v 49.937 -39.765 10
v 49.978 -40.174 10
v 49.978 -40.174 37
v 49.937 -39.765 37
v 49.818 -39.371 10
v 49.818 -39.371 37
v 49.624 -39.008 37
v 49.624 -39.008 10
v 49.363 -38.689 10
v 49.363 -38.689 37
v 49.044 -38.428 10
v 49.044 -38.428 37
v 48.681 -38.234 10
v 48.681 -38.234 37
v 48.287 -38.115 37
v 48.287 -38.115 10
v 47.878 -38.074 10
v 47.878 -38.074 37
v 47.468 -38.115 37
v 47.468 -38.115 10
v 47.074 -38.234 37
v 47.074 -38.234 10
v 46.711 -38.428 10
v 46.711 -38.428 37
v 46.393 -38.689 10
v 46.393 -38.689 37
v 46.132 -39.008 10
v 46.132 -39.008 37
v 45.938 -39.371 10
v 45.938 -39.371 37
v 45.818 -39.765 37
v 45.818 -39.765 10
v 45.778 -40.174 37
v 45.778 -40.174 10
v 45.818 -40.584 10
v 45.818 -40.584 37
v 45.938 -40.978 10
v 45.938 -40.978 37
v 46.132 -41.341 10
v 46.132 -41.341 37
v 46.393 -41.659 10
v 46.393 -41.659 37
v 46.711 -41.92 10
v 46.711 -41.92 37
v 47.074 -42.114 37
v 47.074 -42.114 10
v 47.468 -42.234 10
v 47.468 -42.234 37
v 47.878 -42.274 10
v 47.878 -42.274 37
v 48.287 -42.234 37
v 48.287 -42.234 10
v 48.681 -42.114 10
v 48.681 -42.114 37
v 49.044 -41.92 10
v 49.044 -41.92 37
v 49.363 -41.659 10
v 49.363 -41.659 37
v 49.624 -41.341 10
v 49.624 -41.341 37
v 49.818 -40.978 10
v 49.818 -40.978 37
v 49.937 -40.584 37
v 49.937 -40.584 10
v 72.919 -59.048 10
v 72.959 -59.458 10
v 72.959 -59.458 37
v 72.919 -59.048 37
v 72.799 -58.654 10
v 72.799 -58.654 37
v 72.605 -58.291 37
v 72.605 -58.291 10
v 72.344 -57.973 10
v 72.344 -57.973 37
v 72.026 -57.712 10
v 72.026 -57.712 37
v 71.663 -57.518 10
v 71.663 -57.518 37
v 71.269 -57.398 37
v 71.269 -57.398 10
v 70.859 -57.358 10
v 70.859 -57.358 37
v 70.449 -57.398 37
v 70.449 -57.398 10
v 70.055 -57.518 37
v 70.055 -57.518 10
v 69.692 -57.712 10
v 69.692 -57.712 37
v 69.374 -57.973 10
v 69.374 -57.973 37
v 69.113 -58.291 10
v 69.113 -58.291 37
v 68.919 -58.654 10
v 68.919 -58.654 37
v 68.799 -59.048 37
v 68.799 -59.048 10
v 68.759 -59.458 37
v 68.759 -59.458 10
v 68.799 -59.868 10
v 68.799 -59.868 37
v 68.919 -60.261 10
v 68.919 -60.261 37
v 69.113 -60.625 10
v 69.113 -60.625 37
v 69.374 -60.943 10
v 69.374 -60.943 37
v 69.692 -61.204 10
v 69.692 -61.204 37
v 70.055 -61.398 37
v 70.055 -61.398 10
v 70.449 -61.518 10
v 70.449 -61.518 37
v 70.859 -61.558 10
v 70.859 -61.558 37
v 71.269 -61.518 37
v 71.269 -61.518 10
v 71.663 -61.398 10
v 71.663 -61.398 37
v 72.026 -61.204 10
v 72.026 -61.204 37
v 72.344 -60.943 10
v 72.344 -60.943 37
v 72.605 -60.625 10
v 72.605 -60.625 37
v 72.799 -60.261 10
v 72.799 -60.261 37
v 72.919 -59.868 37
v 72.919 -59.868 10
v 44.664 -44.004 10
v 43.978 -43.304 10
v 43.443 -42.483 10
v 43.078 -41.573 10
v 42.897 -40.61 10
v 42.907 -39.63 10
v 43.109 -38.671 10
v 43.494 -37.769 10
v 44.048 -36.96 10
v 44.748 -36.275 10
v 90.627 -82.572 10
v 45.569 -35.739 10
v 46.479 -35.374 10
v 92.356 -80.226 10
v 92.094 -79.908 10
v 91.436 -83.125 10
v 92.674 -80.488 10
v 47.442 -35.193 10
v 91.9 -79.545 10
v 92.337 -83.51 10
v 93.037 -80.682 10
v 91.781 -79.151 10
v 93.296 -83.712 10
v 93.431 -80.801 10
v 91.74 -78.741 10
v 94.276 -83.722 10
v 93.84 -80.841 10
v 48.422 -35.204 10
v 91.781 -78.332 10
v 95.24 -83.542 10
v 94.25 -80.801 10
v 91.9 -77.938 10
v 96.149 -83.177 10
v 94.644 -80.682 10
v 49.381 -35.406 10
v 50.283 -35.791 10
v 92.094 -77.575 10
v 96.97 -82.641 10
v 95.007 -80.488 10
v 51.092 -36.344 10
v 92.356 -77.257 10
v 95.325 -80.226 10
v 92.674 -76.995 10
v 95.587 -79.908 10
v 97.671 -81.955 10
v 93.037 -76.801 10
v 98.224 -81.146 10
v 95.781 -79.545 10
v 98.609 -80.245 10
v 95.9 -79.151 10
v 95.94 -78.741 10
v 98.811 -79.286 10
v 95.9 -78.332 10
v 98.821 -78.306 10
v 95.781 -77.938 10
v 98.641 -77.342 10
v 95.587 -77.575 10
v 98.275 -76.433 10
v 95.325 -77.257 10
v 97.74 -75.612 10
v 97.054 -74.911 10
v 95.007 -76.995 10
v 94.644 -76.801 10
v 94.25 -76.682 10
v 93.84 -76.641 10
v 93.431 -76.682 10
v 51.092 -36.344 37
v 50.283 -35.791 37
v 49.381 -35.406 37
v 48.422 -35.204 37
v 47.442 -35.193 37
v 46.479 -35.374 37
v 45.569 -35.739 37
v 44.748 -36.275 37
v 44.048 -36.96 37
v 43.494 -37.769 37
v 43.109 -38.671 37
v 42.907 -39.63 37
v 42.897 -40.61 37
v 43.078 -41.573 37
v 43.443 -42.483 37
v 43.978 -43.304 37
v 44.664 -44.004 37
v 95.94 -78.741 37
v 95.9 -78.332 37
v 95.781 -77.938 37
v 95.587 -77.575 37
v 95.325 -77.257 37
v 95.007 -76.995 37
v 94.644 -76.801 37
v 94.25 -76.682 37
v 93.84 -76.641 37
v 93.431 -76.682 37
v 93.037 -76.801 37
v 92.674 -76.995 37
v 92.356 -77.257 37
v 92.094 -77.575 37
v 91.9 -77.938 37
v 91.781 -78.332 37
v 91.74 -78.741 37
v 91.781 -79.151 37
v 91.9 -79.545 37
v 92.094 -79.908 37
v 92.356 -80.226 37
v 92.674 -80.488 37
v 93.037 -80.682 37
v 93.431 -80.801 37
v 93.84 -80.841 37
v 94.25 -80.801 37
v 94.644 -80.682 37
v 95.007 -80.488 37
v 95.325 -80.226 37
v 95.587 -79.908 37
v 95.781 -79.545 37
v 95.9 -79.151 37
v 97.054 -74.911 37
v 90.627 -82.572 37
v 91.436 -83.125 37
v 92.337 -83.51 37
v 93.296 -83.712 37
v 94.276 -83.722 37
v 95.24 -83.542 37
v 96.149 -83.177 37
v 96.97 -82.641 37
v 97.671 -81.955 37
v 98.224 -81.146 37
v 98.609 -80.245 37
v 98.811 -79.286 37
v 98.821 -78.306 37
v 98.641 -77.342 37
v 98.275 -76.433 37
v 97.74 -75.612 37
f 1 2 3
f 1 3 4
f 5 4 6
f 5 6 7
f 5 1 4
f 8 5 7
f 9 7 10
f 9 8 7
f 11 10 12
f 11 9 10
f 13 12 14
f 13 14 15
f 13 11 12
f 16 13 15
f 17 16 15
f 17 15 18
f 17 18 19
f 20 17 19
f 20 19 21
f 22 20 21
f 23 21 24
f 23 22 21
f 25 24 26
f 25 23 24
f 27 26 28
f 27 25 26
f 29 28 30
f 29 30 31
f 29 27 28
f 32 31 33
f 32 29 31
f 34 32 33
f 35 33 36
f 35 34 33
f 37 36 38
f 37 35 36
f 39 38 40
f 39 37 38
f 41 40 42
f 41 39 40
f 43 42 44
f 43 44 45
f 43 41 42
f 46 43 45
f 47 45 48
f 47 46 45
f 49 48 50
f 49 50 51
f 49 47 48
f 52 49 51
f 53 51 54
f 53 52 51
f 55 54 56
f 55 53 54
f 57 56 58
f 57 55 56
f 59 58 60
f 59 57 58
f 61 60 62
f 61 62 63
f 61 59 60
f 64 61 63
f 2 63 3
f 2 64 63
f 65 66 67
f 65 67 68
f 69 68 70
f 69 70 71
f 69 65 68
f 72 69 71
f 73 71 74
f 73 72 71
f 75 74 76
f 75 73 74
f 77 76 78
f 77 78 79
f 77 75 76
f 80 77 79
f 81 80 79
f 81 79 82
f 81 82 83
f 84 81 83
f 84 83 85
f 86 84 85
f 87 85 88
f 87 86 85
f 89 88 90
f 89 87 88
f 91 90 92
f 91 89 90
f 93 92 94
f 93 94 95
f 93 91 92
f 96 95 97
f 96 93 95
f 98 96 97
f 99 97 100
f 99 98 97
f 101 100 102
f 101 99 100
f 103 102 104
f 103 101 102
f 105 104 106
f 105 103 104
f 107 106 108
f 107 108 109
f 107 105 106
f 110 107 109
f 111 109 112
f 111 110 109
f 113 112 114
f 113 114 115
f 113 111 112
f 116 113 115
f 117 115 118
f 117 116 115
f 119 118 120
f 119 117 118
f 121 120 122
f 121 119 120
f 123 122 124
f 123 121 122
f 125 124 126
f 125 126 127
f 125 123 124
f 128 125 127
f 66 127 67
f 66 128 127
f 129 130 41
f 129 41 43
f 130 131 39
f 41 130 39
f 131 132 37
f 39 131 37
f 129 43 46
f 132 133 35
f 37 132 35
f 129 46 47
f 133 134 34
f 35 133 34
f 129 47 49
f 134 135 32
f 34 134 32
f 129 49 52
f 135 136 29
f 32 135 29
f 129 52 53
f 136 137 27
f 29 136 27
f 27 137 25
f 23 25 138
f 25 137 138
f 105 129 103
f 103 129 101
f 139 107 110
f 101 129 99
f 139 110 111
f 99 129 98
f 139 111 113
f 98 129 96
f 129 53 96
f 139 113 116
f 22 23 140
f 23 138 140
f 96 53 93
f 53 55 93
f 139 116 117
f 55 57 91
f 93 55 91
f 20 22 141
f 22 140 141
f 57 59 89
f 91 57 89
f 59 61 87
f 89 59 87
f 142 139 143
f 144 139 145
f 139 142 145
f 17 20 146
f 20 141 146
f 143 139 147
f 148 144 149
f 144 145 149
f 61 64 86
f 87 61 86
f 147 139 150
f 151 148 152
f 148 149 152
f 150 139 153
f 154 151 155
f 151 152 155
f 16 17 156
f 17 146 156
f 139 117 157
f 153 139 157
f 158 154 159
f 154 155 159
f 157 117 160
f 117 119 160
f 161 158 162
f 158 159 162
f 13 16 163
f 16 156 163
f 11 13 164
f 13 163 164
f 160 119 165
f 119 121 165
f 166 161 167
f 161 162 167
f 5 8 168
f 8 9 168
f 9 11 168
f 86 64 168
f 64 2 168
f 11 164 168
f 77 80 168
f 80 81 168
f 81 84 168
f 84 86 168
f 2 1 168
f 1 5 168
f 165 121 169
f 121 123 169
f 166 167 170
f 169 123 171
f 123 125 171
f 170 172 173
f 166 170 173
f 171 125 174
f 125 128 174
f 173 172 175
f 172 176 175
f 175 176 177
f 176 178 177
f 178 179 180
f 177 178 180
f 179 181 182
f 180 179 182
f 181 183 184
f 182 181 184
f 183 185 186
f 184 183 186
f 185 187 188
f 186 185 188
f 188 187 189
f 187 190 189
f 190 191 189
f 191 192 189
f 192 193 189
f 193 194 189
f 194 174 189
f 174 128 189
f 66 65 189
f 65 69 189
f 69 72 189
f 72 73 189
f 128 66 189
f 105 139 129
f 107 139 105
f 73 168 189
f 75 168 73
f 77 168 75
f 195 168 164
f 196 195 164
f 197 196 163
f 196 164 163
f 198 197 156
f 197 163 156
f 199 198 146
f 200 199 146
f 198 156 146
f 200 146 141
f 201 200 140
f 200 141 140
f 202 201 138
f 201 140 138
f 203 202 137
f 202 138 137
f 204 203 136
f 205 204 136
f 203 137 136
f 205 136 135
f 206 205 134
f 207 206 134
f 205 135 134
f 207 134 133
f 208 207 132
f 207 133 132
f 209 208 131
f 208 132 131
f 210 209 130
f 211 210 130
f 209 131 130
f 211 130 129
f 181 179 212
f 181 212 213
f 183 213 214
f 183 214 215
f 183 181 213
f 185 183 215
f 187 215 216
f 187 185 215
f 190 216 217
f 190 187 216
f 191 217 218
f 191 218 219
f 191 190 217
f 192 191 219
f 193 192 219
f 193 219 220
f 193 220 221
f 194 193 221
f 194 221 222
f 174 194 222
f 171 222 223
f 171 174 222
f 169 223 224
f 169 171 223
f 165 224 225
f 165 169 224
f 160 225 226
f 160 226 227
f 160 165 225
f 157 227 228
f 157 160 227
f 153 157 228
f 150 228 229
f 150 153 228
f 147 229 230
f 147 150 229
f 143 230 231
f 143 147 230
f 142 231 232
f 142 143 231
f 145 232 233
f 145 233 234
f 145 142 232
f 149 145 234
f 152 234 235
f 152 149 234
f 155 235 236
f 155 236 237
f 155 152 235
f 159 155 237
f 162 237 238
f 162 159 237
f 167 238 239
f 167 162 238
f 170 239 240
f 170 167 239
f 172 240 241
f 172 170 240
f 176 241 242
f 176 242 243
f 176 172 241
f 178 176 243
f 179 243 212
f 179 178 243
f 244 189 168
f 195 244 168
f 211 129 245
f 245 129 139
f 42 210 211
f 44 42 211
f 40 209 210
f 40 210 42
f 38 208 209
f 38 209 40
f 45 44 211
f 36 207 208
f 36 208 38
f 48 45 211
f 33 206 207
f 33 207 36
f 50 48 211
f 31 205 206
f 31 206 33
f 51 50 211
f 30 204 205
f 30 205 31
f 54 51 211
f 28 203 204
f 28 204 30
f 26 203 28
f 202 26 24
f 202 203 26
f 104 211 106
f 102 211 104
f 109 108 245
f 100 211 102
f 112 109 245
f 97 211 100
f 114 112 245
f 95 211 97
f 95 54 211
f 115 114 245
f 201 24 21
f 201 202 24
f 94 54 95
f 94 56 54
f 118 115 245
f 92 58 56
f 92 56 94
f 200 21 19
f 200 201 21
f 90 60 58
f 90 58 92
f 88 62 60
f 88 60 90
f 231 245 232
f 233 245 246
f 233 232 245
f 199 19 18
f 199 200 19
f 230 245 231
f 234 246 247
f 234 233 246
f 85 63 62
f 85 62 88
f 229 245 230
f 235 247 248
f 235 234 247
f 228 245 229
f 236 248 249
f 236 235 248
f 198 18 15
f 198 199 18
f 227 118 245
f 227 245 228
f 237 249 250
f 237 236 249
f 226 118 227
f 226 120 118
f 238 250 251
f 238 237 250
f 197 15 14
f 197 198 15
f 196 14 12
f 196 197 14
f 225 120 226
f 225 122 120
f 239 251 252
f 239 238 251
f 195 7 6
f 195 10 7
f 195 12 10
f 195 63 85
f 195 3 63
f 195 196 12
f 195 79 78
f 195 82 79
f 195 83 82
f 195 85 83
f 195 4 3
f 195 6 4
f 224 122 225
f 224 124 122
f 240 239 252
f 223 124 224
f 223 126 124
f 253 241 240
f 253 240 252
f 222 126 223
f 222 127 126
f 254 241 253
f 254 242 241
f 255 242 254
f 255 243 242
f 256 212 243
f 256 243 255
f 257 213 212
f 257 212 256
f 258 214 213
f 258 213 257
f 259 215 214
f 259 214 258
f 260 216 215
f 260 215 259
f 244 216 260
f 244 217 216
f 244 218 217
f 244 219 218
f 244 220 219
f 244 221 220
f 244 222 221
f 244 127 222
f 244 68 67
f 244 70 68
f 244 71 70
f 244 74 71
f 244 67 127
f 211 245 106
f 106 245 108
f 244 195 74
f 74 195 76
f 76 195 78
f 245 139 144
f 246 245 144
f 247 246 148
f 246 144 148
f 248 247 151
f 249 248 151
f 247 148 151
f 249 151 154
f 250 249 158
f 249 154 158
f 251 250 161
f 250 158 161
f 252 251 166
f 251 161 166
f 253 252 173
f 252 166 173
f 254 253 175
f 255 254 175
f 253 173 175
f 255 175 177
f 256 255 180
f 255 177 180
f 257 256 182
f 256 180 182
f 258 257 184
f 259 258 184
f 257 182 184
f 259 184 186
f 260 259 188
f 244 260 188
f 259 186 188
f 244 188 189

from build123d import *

# Parameters (mm, degrees)
SKETCH1_R           = 2.1
BOSS_EXTRUDE1_DEPTH = 27


with BuildPart() as part:
    # Sketch1 → Boss-Extrude1 (new body)
    with BuildSketch(Plane.XY.offset(10)):
        with BuildLine():
            Line((44.663839647, -44.004447821), (90.626506234, -82.571704402))
            ThreePointArc((90.626506234, -82.571704402), (97.670666498, -81.955420235), (97.054382331, -74.911259971))
            Line((97.054382331, -74.911259971), (51.091715743, -36.34400339))
            ThreePointArc((51.091715743, -36.34400339), (44.047555479, -36.960287557), (44.663839647, -44.004447821))
        make_face()
        with Locations((47.877777695, -40.174225605)):
            Circle(SKETCH1_R, mode=Mode.SUBTRACT)
        with Locations((70.859110989, -59.457853896)):
            Circle(SKETCH1_R, mode=Mode.SUBTRACT)
        with Locations((93.840444282, -78.741482187)):
            Circle(SKETCH1_R, mode=Mode.SUBTRACT)
    extrude(amount=BOSS_EXTRUDE1_DEPTH)


solid = part.part
